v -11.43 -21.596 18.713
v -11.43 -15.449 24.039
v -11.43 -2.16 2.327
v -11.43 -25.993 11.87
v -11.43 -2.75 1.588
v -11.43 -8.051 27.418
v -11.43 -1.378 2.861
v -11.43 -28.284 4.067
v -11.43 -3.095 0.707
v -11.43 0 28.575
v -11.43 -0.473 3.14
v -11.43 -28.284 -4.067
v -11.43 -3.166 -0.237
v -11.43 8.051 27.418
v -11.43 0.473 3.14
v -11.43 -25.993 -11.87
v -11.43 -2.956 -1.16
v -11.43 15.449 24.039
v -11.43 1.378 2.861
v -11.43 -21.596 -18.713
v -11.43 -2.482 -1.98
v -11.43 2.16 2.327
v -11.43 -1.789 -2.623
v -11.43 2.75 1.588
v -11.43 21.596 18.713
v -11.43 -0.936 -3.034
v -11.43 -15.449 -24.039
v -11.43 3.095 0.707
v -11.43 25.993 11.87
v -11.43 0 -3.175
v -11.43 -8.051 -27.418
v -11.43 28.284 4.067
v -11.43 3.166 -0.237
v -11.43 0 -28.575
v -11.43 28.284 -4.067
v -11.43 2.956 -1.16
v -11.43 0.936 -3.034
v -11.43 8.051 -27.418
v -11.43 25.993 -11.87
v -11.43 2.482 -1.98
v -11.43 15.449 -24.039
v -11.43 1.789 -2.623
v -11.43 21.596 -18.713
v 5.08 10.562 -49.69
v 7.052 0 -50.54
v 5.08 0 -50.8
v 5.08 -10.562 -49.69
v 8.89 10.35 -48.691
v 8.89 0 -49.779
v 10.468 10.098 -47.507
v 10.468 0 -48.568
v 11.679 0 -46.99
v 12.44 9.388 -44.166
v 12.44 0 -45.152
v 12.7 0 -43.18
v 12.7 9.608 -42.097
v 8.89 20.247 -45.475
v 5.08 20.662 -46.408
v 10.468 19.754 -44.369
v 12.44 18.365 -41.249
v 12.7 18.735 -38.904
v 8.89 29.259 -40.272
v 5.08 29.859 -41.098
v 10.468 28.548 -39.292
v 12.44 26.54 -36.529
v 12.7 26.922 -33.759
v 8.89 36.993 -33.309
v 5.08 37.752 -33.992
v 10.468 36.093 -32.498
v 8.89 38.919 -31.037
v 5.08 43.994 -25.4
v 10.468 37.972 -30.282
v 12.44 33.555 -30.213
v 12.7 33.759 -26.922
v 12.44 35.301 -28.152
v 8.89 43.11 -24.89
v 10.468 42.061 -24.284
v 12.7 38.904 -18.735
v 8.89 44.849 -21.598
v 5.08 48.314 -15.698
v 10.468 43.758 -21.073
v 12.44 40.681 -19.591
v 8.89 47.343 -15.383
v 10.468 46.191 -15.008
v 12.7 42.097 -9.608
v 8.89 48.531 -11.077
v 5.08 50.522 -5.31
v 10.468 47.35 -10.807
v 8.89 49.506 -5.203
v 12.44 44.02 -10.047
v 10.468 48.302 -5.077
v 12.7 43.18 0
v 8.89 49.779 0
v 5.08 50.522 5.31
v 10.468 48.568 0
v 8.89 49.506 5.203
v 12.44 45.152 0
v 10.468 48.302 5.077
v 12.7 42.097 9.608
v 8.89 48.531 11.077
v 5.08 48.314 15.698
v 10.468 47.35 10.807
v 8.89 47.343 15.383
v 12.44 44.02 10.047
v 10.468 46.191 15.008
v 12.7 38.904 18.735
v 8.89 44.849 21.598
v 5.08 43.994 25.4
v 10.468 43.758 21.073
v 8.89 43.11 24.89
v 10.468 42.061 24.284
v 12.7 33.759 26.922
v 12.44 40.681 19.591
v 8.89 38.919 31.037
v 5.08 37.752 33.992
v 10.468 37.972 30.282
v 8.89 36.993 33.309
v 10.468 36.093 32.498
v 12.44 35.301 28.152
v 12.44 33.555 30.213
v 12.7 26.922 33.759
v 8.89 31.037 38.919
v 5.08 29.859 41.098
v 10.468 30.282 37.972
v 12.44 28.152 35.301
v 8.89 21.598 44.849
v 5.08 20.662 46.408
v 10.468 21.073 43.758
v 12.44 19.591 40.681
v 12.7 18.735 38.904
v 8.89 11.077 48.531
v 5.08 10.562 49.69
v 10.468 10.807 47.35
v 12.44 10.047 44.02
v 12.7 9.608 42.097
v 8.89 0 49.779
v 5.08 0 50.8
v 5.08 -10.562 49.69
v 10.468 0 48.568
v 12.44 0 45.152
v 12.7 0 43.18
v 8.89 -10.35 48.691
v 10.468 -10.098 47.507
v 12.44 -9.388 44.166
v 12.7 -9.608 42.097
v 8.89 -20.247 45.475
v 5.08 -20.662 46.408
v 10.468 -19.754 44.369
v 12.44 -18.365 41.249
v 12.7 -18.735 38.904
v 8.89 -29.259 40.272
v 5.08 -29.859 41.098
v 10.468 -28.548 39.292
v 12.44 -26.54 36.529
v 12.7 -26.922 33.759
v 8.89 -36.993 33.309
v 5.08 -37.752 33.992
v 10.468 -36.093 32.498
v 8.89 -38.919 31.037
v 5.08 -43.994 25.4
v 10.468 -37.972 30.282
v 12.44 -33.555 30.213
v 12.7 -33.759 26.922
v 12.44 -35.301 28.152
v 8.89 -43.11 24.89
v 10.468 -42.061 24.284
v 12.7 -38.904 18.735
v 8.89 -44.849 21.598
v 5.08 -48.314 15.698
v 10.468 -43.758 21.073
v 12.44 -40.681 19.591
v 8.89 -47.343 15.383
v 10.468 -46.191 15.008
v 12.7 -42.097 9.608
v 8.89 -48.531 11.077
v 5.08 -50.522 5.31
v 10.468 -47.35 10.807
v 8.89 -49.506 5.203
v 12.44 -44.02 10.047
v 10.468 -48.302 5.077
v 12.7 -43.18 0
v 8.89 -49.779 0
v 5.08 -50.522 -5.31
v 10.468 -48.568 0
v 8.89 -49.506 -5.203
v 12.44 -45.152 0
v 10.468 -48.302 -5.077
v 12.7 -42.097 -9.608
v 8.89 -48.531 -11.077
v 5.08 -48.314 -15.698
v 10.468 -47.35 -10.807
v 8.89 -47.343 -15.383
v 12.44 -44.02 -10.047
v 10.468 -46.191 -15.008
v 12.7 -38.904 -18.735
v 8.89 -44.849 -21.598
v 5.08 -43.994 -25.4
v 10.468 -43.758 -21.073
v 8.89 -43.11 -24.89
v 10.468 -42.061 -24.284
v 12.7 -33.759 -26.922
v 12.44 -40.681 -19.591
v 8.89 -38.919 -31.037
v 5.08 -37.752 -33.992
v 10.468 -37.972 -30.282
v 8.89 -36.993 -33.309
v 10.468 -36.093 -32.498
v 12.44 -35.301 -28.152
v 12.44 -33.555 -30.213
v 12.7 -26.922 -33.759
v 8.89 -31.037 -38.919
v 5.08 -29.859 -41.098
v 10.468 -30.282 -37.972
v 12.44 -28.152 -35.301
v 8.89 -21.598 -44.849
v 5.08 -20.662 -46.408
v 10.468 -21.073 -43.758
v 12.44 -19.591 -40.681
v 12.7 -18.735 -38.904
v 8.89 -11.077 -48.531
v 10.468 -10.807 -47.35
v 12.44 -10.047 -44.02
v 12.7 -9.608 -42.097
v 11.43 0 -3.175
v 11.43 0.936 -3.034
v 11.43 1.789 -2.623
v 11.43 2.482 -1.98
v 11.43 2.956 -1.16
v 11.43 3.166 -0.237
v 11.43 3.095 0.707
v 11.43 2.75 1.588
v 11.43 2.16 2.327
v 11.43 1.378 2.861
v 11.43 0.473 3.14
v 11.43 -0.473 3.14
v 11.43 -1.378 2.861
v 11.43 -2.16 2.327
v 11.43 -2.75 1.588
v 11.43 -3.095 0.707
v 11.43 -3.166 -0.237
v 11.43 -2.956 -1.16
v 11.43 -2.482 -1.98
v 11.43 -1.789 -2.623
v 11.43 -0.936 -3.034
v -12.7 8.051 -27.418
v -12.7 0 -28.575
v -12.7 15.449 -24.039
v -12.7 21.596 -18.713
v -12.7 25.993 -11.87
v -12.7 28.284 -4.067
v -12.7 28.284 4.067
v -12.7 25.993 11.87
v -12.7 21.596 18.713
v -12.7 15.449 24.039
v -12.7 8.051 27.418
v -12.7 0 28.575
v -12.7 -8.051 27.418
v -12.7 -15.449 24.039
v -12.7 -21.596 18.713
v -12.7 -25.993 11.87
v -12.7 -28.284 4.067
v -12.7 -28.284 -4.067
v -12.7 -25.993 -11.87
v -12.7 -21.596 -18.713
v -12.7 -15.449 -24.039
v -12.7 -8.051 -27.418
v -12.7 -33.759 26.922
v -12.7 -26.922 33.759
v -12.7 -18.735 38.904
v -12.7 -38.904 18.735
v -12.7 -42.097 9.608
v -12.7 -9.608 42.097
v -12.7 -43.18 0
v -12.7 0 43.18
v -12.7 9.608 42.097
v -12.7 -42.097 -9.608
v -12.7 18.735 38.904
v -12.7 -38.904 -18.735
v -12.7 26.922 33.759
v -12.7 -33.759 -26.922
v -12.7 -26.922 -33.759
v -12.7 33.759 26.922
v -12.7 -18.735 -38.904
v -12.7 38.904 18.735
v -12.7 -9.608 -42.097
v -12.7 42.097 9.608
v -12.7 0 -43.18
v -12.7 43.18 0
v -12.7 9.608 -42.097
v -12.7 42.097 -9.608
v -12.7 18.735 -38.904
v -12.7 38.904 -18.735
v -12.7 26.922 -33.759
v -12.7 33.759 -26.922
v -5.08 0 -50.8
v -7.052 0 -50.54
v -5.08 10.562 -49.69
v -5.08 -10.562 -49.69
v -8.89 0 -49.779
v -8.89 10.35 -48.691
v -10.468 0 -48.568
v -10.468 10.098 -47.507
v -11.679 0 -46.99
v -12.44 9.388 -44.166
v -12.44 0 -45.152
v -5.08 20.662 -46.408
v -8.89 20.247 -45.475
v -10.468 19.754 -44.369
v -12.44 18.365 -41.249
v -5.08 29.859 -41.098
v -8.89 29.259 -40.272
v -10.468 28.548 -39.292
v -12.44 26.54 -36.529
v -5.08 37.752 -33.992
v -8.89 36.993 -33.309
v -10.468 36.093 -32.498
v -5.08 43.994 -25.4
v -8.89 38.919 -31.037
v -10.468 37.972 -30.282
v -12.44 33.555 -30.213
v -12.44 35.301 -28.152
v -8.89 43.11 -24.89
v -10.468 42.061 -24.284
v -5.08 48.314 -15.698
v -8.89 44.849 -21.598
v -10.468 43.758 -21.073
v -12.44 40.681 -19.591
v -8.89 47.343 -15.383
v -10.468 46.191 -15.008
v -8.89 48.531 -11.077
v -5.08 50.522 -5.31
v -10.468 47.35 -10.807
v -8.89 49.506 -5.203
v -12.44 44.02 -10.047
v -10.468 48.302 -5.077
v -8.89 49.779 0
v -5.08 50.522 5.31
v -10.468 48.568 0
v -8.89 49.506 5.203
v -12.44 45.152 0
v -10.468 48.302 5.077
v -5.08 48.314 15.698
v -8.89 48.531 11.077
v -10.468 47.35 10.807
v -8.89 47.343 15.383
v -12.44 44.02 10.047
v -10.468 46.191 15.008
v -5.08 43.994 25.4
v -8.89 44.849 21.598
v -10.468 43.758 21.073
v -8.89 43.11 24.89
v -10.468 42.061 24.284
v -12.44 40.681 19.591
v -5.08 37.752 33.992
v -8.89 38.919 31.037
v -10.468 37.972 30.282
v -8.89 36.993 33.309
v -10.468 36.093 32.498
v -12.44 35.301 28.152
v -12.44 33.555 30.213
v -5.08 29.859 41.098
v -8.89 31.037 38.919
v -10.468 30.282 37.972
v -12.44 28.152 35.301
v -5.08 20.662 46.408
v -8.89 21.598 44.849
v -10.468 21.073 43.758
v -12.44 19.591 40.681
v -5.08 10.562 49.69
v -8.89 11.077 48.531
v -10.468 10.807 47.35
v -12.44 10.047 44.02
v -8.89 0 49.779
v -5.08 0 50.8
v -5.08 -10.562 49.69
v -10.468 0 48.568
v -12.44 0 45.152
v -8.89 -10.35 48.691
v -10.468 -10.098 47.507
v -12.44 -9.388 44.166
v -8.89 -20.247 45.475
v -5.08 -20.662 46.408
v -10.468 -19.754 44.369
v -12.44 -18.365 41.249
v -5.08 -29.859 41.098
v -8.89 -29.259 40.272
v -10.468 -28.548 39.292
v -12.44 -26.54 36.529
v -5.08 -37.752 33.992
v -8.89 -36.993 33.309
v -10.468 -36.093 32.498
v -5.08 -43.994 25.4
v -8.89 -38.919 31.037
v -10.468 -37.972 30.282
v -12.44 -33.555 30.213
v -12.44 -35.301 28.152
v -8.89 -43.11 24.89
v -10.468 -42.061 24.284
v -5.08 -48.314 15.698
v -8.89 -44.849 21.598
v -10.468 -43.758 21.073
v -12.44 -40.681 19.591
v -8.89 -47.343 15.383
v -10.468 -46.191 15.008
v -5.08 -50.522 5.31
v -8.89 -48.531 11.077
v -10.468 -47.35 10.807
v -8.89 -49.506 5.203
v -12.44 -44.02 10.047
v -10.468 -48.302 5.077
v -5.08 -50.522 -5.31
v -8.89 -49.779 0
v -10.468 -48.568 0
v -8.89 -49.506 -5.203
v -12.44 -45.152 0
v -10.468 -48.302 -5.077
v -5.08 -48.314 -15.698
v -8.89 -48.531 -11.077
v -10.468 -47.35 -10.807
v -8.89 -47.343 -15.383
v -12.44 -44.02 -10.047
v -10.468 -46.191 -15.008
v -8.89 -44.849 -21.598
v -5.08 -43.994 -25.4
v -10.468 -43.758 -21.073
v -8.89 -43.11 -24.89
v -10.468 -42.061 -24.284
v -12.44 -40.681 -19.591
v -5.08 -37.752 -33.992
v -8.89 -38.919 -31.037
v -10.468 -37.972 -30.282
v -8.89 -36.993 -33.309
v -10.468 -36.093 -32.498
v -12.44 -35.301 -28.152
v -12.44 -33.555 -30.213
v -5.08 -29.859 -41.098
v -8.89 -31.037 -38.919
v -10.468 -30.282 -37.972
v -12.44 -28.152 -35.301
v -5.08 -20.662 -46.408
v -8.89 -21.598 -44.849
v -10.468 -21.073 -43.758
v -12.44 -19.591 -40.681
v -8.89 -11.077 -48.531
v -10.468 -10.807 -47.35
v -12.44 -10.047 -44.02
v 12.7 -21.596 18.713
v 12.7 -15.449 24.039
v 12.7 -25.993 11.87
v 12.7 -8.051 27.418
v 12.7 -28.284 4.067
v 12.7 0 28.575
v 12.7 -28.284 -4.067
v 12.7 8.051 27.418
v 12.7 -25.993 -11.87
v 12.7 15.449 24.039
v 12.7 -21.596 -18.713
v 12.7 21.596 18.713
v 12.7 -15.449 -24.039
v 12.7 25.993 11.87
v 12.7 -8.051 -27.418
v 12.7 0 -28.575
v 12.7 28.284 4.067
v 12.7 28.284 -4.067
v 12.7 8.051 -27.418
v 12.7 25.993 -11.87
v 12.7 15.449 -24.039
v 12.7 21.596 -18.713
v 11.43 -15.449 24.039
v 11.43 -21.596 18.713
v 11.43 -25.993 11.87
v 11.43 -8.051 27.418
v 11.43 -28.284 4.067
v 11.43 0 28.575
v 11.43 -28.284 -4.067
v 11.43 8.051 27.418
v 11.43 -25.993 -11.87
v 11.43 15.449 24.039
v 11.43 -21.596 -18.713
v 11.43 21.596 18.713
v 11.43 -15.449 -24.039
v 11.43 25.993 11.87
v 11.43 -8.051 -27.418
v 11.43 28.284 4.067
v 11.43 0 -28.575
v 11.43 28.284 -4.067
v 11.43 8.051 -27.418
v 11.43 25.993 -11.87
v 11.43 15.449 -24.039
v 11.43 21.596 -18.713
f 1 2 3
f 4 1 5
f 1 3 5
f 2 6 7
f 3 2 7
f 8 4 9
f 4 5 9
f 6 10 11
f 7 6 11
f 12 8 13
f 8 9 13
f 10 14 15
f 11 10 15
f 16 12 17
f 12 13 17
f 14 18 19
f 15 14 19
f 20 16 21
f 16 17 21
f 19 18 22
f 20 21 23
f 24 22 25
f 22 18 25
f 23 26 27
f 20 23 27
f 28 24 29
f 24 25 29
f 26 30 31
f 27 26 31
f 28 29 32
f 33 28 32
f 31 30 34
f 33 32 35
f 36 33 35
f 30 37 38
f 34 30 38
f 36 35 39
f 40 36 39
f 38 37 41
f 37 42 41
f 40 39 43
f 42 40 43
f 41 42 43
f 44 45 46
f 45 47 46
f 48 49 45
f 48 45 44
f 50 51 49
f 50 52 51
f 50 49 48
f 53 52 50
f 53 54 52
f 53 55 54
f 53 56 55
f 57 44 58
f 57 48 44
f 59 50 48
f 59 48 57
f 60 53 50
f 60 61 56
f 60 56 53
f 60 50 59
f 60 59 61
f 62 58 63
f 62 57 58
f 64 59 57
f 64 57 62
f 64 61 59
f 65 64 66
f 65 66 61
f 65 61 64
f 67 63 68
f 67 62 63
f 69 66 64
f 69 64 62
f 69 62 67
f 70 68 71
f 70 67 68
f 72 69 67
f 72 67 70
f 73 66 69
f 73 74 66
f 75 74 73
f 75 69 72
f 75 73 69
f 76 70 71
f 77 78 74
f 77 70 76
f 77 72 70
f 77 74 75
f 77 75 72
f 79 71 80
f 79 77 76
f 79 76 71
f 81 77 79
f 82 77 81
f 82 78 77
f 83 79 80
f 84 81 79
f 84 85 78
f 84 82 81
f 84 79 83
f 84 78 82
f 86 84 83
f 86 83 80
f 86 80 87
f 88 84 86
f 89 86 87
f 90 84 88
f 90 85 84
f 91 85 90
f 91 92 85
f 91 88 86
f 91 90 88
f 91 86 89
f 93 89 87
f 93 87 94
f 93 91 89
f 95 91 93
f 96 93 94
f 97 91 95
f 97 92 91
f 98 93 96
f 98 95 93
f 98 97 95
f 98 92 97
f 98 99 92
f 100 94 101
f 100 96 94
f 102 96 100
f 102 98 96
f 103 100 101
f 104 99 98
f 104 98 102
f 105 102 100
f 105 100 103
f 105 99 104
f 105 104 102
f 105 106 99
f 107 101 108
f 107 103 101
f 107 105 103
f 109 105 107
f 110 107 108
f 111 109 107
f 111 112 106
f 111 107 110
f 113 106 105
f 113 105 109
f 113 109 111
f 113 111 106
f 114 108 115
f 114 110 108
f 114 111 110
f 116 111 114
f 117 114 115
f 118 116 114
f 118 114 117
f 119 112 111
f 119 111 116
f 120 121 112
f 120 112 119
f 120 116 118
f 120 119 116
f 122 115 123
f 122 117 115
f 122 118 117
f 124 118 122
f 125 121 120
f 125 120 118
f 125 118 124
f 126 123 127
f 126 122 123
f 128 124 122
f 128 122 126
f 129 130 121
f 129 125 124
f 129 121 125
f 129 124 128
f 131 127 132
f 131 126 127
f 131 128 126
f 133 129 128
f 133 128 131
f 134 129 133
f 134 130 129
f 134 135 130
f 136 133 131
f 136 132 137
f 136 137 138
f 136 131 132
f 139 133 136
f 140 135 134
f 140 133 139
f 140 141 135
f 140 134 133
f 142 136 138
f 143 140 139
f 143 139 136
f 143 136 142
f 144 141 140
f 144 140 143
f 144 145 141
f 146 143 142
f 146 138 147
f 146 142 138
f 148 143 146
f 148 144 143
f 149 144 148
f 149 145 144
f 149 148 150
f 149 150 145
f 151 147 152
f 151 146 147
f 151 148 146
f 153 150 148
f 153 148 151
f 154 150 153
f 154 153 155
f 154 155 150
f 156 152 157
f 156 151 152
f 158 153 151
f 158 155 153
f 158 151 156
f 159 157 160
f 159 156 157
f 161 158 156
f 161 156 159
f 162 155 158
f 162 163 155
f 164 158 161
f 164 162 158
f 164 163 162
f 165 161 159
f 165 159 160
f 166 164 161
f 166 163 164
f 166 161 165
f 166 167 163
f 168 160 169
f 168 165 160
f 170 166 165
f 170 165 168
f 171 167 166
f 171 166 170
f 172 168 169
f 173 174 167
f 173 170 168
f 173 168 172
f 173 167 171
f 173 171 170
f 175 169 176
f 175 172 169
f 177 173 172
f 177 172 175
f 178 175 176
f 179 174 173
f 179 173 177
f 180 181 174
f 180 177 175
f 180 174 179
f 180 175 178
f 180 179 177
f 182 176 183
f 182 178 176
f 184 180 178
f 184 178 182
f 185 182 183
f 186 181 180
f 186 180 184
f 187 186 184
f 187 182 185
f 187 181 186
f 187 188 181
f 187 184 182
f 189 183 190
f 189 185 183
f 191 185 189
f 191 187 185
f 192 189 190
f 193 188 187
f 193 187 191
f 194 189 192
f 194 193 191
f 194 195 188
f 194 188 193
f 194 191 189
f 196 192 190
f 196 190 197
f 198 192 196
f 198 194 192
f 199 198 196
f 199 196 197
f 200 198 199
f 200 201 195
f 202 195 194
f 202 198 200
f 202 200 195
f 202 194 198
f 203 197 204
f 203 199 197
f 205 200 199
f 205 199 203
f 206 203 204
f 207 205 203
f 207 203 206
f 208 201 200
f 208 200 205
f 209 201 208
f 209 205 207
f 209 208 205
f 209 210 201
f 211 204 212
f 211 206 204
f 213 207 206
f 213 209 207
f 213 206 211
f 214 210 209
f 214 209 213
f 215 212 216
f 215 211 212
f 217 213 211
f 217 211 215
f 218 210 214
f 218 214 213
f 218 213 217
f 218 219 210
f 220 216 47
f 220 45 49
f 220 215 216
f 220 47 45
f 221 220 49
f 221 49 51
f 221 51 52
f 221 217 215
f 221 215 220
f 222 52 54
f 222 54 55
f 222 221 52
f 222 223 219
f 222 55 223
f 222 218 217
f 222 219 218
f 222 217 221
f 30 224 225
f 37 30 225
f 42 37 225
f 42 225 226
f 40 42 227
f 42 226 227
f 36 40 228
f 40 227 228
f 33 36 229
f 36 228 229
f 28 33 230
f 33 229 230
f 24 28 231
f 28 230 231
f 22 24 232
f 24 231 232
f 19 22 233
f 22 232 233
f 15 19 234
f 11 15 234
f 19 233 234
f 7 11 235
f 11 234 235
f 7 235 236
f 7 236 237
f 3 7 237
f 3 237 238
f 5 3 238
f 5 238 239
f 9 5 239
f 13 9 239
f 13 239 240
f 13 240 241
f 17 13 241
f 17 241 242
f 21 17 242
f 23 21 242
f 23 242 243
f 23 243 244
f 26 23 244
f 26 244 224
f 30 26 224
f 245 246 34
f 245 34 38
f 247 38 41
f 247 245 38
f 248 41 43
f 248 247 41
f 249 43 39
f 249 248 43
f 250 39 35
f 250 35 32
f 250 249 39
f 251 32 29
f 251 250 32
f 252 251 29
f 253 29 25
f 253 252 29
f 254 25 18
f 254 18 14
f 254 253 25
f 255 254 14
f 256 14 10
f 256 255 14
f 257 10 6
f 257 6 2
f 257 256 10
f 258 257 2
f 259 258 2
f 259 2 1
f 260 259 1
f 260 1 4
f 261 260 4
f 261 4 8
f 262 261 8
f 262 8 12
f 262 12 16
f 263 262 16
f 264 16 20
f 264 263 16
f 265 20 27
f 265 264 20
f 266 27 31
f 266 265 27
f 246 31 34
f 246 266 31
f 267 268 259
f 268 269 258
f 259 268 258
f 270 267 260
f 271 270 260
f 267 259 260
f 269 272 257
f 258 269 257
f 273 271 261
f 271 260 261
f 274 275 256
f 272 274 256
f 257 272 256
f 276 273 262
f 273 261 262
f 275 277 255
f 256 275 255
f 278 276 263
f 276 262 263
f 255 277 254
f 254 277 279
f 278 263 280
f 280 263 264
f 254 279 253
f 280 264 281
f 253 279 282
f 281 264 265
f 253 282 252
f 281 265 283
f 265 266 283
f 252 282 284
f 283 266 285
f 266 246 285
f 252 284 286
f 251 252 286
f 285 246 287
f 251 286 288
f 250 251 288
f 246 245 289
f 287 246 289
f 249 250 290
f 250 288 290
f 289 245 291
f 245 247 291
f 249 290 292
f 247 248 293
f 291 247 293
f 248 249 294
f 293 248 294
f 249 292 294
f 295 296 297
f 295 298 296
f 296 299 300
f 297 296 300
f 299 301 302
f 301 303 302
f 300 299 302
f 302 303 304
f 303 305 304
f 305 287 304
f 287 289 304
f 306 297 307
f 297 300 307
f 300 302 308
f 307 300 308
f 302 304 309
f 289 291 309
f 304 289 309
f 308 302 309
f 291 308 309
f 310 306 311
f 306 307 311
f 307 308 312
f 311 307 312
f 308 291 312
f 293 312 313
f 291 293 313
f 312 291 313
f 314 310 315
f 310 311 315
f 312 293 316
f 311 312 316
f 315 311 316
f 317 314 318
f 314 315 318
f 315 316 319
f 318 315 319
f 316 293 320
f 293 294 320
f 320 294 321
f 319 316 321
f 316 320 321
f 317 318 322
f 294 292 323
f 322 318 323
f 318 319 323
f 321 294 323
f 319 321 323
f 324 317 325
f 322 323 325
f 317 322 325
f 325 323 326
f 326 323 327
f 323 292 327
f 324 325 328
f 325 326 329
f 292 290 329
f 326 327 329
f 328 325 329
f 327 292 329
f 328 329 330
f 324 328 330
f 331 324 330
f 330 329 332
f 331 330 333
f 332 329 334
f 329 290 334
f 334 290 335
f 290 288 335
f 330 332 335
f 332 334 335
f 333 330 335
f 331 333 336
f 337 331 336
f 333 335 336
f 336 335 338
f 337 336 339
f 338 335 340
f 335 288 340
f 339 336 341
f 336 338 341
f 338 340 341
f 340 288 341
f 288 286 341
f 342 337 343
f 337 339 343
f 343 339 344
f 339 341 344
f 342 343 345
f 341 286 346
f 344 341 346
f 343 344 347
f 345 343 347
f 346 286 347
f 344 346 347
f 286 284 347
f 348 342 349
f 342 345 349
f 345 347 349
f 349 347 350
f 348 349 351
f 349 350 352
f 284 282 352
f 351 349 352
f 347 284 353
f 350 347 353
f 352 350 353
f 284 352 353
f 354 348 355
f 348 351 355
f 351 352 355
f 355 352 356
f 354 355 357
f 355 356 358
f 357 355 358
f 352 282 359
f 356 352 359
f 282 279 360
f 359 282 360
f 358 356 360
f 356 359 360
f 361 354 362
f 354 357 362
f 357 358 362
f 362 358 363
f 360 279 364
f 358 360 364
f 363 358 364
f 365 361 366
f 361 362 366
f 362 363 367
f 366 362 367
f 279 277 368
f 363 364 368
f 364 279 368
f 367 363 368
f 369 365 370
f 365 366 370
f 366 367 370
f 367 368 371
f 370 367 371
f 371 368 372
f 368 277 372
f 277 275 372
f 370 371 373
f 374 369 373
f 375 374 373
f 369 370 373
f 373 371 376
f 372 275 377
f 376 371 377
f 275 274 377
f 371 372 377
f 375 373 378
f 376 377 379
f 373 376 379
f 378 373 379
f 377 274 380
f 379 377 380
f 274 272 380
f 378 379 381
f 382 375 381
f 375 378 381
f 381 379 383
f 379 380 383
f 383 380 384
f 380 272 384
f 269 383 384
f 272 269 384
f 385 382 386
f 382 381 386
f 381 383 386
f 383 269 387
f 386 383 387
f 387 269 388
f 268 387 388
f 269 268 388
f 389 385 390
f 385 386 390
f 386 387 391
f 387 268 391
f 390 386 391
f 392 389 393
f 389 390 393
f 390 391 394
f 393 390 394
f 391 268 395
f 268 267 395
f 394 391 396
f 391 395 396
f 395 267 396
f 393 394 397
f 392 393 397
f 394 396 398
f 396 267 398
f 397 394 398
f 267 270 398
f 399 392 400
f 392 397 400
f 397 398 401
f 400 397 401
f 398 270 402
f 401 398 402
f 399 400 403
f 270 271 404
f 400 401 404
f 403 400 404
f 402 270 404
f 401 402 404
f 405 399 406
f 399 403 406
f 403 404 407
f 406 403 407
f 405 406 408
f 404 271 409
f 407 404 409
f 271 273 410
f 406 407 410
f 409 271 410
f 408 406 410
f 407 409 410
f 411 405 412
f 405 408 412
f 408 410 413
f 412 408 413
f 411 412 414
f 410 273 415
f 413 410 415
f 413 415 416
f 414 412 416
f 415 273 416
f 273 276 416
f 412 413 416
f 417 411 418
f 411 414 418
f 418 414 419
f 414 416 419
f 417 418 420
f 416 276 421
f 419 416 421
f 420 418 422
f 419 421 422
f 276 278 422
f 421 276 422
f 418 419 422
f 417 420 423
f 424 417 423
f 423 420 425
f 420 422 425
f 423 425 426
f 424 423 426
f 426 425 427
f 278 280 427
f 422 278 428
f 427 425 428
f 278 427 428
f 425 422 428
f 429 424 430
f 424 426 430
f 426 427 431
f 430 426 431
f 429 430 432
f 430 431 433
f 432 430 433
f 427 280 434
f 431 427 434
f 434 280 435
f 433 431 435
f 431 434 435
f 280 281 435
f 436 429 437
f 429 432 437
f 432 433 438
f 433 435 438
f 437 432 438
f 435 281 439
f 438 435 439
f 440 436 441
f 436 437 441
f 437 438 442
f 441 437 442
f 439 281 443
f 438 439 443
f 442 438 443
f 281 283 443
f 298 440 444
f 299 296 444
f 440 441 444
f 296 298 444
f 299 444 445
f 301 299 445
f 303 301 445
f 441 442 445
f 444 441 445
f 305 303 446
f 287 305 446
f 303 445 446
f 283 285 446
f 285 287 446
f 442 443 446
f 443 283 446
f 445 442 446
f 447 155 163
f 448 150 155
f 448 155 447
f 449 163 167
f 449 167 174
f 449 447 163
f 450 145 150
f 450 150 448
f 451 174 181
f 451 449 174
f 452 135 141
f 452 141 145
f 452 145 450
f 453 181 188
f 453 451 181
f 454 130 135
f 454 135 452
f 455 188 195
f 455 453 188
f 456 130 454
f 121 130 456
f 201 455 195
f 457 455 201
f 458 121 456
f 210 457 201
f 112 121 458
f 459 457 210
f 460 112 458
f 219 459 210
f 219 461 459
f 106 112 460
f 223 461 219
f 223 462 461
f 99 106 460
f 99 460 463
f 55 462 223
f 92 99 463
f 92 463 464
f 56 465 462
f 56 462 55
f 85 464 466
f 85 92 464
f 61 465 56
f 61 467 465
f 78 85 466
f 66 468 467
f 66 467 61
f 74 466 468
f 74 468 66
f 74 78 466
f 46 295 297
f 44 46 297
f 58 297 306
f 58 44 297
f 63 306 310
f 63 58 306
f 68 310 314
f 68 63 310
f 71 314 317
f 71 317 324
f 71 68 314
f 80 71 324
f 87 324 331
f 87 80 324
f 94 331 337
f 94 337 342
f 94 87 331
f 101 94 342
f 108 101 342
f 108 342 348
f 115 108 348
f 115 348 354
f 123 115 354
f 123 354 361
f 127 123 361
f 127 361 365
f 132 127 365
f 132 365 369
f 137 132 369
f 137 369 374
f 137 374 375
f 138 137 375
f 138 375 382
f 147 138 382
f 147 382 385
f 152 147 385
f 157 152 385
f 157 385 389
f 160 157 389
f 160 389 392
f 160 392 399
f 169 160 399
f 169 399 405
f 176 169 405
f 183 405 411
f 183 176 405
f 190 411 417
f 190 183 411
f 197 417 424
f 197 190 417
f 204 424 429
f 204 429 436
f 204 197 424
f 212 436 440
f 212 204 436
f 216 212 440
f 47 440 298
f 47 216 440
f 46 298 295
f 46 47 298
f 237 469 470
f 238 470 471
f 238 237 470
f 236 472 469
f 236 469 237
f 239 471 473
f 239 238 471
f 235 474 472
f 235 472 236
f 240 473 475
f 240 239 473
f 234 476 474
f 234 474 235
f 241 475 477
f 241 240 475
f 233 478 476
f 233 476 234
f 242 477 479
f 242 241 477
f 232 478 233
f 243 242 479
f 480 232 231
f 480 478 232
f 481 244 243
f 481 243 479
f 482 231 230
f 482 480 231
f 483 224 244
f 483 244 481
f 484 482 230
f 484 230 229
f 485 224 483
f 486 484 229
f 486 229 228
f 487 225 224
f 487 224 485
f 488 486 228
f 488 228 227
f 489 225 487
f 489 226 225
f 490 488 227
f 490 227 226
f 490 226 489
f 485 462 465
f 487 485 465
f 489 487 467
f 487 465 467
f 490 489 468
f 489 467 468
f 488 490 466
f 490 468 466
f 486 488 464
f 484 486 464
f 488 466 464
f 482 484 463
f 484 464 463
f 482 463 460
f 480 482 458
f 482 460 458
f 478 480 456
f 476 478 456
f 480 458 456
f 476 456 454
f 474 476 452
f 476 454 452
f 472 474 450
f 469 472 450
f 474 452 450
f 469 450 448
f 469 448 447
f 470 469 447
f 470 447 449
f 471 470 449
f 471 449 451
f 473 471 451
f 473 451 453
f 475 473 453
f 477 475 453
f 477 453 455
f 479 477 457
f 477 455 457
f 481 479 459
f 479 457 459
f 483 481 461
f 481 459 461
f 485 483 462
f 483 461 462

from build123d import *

# Parameters (mm, degrees)
SKETCH1_R           = 50.8
BOSS_EXTRUDE1_DEPTH = 12.7
SKETCH2_R           = 3.175
CUT_EXTRUDE1_DEPTH  = 77.2
FILLET1_R           = 7.62
SKETCH3_R           = 28.575
CUT_EXTRUDE2_DEPTH  = 1.27


with BuildPart() as part:
    # Sketch1 → Boss-Extrude1 (new, symmetric)
    with BuildSketch(Plane(origin=(0, 0, 0), x_dir=(0, 0, -1), z_dir=(1, 0, 0))):
        Circle(SKETCH1_R)
    extrude(amount=BOSS_EXTRUDE1_DEPTH, both=True)

    # Sketch2 → Cut-Extrude1 (cut, through all)
    with BuildSketch(Plane(origin=(12.7, 0, 0), x_dir=(0, 0, -1), z_dir=(1, 0, 0))):
        Circle(SKETCH2_R)
    extrude(amount=-CUT_EXTRUDE1_DEPTH, mode=Mode.SUBTRACT)

    # Fillet1
    fillet1_edges = [part.edges().sort_by_distance(p)[0] for p in [
        (-12.7, 0, 50.8),
        (12.7, 0, 50.8),
    ]]
    fillet(fillet1_edges, radius=FILLET1_R)

    # Sketch3 → Cut-Extrude2 (cut)
    with BuildSketch(Plane(origin=(12.7, 0, 0), x_dir=(0, 0, -1), z_dir=(1, 0, 0))):
        Circle(SKETCH3_R)
    cut_extrude2 = extrude(amount=-CUT_EXTRUDE2_DEPTH, mode=Mode.SUBTRACT)

    # Mirror1: Cut-Extrude2 across plane
    add(cut_extrude2.mirror(Plane(origin=(0, 0, 0), x_dir=(0, 0, 1), z_dir=(1, 0, 0))), mode=Mode.SUBTRACT)


solid = part.part
